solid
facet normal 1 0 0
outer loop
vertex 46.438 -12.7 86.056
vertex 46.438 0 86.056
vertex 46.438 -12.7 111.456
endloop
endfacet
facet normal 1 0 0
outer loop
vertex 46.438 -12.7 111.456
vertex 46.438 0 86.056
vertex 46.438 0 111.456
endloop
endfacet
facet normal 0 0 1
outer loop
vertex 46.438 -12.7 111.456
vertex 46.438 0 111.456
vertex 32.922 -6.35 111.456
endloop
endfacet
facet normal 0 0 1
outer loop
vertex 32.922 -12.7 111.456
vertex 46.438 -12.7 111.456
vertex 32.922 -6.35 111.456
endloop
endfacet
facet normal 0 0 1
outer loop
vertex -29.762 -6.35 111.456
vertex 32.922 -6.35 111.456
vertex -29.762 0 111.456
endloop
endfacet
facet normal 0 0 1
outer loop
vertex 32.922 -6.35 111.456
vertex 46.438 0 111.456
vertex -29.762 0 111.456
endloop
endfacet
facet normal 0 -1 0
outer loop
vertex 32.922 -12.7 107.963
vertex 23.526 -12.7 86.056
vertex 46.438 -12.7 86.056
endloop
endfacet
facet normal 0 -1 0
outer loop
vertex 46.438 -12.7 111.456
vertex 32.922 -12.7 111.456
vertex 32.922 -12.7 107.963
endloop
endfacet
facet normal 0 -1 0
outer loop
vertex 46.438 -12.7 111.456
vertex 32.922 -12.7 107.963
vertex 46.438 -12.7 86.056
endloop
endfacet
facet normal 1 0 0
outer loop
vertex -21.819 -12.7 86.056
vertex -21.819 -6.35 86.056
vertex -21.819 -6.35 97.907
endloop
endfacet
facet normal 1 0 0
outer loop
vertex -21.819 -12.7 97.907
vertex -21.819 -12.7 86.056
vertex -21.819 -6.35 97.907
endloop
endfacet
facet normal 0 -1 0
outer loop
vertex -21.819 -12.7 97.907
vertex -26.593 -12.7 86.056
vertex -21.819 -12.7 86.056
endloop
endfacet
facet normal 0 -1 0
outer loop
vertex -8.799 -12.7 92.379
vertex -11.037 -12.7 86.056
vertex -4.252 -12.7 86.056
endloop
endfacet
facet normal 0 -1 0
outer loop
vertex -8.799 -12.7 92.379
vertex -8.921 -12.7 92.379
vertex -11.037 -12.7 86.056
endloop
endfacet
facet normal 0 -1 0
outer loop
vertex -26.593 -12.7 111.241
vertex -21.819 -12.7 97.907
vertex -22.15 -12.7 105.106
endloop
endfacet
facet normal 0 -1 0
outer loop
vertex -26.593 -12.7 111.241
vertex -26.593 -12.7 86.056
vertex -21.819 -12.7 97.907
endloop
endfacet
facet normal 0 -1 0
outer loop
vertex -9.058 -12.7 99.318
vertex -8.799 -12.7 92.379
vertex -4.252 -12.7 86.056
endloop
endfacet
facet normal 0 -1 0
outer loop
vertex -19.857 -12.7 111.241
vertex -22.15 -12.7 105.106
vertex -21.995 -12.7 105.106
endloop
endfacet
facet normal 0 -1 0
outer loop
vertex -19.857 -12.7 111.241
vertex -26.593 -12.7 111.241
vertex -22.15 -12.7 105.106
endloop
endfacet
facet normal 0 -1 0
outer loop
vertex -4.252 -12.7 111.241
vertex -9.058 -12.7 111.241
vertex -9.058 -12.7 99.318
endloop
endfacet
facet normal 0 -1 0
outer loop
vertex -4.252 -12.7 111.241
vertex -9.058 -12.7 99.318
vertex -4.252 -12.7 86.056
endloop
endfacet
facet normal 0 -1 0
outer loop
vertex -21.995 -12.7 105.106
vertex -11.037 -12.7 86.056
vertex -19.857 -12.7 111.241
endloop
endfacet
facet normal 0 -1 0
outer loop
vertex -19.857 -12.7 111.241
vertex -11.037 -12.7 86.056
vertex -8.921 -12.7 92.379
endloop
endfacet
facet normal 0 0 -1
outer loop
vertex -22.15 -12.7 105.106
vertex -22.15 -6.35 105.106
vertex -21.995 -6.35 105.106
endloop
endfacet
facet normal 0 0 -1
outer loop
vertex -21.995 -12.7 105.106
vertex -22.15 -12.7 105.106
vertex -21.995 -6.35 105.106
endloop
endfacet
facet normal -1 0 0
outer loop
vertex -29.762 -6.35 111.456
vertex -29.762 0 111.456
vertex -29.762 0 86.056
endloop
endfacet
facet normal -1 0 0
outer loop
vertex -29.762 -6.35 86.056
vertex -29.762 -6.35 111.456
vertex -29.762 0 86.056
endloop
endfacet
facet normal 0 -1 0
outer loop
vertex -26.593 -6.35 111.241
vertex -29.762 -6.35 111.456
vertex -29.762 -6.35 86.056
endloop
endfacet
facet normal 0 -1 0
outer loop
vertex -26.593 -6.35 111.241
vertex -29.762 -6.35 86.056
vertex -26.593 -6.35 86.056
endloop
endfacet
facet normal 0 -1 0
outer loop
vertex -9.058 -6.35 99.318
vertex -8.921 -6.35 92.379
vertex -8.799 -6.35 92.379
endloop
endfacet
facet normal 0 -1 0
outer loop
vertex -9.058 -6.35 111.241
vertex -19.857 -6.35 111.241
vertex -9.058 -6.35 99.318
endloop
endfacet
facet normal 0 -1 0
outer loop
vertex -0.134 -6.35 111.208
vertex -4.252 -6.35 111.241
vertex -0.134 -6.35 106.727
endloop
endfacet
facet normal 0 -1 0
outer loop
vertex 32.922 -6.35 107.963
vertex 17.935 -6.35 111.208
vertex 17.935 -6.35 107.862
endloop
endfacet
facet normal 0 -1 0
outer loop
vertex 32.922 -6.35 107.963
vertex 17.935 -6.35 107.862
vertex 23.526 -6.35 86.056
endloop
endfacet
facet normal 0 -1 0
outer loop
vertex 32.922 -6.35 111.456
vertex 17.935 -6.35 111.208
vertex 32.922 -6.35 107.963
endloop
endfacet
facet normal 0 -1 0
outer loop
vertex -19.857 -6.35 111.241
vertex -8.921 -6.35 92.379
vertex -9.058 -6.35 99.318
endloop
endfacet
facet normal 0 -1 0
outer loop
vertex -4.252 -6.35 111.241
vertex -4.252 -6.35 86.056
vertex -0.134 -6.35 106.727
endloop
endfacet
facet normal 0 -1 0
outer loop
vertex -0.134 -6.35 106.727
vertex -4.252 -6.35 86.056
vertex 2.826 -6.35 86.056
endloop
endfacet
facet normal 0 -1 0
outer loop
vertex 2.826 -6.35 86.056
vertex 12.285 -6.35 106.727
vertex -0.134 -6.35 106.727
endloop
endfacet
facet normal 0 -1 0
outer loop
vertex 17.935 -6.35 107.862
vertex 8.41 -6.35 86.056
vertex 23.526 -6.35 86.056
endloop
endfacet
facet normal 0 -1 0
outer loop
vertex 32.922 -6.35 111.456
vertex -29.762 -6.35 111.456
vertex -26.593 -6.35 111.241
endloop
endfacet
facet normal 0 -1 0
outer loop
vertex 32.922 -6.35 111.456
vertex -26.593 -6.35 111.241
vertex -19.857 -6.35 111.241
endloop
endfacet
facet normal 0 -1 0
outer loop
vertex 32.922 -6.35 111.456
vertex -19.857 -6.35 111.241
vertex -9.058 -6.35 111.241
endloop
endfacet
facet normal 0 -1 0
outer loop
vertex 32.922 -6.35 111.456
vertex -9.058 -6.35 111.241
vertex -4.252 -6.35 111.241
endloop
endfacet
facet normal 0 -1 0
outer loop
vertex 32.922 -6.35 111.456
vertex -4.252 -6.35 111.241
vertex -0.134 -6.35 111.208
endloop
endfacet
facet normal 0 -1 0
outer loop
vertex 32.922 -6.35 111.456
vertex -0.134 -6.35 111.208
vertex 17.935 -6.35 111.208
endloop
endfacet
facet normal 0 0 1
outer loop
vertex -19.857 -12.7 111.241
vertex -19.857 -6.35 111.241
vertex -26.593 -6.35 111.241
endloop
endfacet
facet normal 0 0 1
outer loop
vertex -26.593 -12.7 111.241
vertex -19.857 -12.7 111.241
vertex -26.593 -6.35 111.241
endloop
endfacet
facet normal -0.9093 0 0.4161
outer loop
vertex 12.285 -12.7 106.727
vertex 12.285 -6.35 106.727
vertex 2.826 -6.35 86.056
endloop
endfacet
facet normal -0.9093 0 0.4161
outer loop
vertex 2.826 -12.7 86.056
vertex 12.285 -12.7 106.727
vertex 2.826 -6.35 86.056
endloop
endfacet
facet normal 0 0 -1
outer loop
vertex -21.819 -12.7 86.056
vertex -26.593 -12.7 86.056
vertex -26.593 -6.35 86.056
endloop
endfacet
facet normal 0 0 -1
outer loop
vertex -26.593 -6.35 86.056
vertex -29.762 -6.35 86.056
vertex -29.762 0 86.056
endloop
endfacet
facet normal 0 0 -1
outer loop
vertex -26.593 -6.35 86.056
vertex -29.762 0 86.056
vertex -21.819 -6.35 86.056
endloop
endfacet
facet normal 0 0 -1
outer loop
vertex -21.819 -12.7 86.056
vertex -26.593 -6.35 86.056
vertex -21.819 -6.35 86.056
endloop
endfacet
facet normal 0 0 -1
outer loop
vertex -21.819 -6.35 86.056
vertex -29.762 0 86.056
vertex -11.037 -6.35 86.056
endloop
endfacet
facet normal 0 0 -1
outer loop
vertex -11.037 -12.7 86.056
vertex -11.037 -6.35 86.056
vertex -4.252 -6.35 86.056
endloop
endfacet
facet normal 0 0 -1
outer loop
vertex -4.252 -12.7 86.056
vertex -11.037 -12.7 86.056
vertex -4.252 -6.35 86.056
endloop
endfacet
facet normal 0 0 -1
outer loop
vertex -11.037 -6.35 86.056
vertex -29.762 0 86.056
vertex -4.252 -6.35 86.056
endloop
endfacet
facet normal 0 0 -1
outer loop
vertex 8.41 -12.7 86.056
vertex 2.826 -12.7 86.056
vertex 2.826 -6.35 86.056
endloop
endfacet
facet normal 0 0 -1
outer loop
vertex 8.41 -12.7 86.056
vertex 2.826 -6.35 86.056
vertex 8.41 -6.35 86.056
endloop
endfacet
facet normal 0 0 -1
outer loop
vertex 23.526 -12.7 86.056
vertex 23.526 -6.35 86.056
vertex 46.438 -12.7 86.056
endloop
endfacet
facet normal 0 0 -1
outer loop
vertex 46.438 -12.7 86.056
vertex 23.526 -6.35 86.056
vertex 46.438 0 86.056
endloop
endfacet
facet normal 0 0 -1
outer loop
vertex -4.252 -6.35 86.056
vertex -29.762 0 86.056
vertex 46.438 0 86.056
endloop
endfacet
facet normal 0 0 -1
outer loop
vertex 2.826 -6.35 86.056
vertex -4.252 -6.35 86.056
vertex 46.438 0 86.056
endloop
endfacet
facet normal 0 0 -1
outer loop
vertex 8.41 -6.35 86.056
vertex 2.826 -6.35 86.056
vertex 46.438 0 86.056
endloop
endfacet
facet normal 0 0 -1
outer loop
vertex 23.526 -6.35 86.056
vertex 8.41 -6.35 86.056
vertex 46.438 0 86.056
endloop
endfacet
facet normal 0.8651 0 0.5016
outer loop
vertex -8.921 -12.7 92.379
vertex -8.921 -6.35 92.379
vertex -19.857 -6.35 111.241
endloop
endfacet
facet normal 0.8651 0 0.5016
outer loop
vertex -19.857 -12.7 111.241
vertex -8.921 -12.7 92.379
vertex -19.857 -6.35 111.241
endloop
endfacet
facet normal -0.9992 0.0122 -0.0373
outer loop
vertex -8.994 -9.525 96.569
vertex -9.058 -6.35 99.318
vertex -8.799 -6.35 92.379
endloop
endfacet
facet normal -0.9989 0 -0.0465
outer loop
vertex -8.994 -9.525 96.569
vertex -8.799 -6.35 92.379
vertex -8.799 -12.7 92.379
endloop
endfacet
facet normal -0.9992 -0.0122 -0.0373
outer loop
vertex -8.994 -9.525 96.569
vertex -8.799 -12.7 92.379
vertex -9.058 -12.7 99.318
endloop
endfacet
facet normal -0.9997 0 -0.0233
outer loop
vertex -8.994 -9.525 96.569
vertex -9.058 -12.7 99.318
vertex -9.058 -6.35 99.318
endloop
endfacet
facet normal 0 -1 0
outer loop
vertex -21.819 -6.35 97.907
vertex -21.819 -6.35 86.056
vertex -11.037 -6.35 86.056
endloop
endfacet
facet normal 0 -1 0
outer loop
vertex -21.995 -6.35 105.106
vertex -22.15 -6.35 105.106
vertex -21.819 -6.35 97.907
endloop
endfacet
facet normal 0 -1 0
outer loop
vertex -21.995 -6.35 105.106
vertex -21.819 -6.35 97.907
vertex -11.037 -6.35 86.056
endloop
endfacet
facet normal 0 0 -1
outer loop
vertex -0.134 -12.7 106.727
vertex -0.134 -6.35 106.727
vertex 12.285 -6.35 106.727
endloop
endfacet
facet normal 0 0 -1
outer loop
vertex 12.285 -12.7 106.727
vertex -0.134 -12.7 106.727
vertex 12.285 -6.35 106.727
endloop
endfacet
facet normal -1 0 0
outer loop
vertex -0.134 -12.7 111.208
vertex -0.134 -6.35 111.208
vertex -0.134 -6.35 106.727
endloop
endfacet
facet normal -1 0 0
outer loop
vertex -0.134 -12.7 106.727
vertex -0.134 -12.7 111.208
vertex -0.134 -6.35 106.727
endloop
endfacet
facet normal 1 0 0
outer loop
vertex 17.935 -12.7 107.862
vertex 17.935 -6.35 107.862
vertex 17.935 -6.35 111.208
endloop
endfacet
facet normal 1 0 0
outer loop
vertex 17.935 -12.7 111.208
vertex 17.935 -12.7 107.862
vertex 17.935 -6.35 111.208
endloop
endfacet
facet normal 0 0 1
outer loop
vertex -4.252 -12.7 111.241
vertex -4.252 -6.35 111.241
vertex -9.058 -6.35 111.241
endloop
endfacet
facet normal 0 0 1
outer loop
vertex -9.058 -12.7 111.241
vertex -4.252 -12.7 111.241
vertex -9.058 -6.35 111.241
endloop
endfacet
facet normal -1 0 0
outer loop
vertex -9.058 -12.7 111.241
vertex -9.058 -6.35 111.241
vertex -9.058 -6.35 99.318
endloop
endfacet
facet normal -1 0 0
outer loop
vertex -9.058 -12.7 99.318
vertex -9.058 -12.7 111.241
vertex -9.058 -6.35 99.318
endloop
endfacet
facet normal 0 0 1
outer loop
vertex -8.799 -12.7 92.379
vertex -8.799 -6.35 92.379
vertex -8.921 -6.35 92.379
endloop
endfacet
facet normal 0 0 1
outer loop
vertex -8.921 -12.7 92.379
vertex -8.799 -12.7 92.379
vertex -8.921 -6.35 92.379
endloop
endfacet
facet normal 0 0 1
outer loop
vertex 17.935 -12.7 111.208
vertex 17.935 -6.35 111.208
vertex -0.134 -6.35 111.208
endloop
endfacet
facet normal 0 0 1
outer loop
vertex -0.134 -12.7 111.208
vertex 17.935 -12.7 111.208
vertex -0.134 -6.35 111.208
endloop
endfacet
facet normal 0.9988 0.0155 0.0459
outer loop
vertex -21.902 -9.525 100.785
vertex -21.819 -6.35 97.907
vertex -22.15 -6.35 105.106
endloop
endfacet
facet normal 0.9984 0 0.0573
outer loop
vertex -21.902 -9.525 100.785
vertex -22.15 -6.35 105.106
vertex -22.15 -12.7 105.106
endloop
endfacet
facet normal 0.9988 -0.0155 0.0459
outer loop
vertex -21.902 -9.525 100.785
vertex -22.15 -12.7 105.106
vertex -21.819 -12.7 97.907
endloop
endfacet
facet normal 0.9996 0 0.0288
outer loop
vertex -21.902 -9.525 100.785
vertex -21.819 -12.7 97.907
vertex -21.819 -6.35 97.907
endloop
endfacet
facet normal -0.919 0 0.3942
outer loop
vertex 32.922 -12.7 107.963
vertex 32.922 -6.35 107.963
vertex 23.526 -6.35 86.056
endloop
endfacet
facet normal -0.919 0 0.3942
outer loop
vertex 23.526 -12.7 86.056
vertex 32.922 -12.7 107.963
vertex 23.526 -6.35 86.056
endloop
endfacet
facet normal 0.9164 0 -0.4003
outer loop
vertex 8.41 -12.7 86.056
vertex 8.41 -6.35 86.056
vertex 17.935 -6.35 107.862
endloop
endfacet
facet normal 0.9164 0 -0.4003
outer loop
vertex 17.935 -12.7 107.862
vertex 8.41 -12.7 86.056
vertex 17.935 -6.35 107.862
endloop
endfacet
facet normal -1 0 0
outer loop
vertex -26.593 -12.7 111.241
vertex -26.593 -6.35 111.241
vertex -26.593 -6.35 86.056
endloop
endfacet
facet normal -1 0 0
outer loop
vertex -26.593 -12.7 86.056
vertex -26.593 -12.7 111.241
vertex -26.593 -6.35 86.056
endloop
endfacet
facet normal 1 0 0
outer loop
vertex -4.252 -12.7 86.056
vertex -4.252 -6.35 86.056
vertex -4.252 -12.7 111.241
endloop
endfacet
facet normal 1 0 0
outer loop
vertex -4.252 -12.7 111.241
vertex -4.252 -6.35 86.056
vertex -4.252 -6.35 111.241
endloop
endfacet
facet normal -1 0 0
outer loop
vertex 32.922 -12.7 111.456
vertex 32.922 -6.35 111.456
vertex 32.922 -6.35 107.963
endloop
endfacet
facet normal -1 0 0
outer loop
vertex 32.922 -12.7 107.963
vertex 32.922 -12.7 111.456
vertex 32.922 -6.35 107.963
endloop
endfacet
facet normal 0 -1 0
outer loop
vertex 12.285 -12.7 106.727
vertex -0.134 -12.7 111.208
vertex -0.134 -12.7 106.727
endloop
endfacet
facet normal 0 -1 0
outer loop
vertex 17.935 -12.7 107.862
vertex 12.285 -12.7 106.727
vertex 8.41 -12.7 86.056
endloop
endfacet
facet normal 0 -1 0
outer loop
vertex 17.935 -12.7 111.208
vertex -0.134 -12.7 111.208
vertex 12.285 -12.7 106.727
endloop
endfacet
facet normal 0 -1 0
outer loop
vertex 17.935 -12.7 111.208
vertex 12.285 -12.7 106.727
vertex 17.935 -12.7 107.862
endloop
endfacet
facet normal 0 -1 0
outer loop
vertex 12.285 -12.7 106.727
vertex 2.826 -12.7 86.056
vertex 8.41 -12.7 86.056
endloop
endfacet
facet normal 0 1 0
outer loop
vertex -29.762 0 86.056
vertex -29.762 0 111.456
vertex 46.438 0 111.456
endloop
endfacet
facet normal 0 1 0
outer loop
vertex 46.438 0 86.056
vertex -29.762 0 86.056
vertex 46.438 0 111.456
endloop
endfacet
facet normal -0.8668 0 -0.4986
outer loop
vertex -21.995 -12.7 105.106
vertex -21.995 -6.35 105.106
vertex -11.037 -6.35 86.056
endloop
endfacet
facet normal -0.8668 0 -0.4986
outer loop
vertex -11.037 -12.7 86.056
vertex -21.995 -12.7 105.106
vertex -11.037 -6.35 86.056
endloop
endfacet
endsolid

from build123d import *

# Parameters (mm, degrees)
F1_DEPTH = 6.35
F2_DEPTH = 12.7
F3_DEPTH = 12.7
F4_DEPTH = 12.7


with BuildPart() as f1:
    # F0 (on Front) → F1 (new body)
    with BuildSketch(Plane.XZ):
        with BuildLine():
            Line((-21.8190787262, 97.9073354615), (-21.8190787262, 86.0562069893))
            Line((-21.8190787262, 86.0562069893), (-11.0373078929, 86.0562069893))
            Line((-11.0373078929, 86.0562069893), (-21.9954676151, 105.1062069893))
            Line((-21.9954676151, 105.1062069893), (-22.1498078929, 105.1062069893))
            add(Edge.make_bspline(
                [(-22.1498078929, 105.1062069893), (-21.8190787262, 100.0625871976), (-21.8190787262, 97.9073354615)],
                knots=[0, 0, 0, 1, 1, 1], degree=2))
        make_face()
    extrude(amount=F1_DEPTH)



with BuildPart() as f1b:
    # F0 (on Front) → F1, piece 2 (new body)
    with BuildSketch(Plane.XZ):
        with BuildLine():
            Line((20.2221105099, 111.4562069893), (-29.762090879, 111.4562069893))
            Line((-29.762090879, 111.4562069893), (-29.762090879, 86.0562069893))
            Line((-29.762090879, 86.0562069893), (-26.5926030318, 86.0562069893))
            Line((-26.5926030318, 86.0562069893), (-26.5926030318, 111.241233031))
            Line((-26.5926030318, 111.241233031), (-19.8567523373, 111.241233031))
            Line((-19.8567523373, 111.241233031), (-8.9206412262, 92.3786462254))
            Line((-8.9206412262, 92.3786462254), (-8.7993738651, 92.3786462254))
            add(Edge.make_bspline(
                [(-8.7993738651, 92.3786462254), (-9.0584450457, 97.2899743504), (-9.0584450457, 99.3184465726)],
                knots=[0, 0, 0, 1, 1, 1], degree=2))
            Line((-9.0584450457, 99.3184465726), (-9.0584450457, 111.241233031))
            Line((-9.0584450457, 111.241233031), (-4.2518478234, 111.241233031))
            Line((-4.2518478234, 111.241233031), (-4.2518478234, 86.0562069893))
            Line((-4.2518478234, 86.0562069893), (2.8257563432, 86.0562069893))
            Line((2.8257563432, 86.0562069893), (12.2846105099, 106.726779906))
            Line((12.2846105099, 106.726779906), (-0.1342696984, 106.726779906))
            Line((-0.1342696984, 106.726779906), (-0.1342696984, 111.2081601143))
            Line((-0.1342696984, 111.2081601143), (17.9345671071, 111.2081601143))
            Line((17.9345671071, 111.2081601143), (17.9345671071, 107.8622833782))
            Line((17.9345671071, 107.8622833782), (8.4095671071, 86.0562069893))
            Line((8.4095671071, 86.0562069893), (20.2221105099, 86.0562069893))
            Line((20.2221105099, 86.0562069893), (23.5261658816, 86.0562069893))
            Line((23.5261658816, 86.0562069893), (32.9221105099, 107.9628691077))
            Line((32.9221105099, 107.9628691077), (32.9221105099, 111.4562069893))
            Line((32.9221105099, 111.4562069893), (20.2221105099, 111.4562069893))
        make_face()
    extrude(amount=F1_DEPTH)

    # F0 (on Front) → F2 (join)
    with BuildSketch(Plane.XZ):
        Polygon((2.8257563432, 86.0562069893), (8.4095671071, 86.0562069893), (17.9345671071, 107.8622833782), (17.9345671071, 111.2081601143), (-0.1342696984, 111.2081601143), (-0.1342696984, 106.726779906), (12.2846105099, 106.726779906), align=None)
    extrude(amount=F2_DEPTH)


with BuildPart() as f1_1:
    add(f1.part)

    add(f1b.part)  # F3 merges F1b
    # F0 (on Front) → F3 (join)
    with BuildSketch(Plane.XZ):
        with BuildLine():
            Line((-26.5926030318, 111.241233031), (-26.5926030318, 86.0562069893))
            Line((-26.5926030318, 86.0562069893), (-21.8190787262, 86.0562069893))
            Line((-21.8190787262, 86.0562069893), (-21.8190787262, 97.9073354615))
            add(Edge.make_bspline(
                [(-22.1498078929, 105.1062069893), (-21.8190787262, 100.0625871976), (-21.8190787262, 97.9073354615)],
                knots=[0, 0, 0, 1, 1, 1], degree=2))
            Line((-22.1498078929, 105.1062069893), (-21.9954676151, 105.1062069893))
            Line((-21.9954676151, 105.1062069893), (-11.0373078929, 86.0562069893))
            Line((-11.0373078929, 86.0562069893), (-4.2518478234, 86.0562069893))
            Line((-4.2518478234, 86.0562069893), (-4.2518478234, 111.241233031))
            Line((-4.2518478234, 111.241233031), (-9.0584450457, 111.241233031))
            Line((-9.0584450457, 111.241233031), (-9.0584450457, 99.3184465726))
            add(Edge.make_bspline(
                [(-8.7993738651, 92.3786462254), (-9.0584450457, 97.2899743504), (-9.0584450457, 99.3184465726)],
                knots=[0, 0, 0, 1, 1, 1], degree=2))
            Line((-8.7993738651, 92.3786462254), (-8.9206412262, 92.3786462254))
            Line((-8.9206412262, 92.3786462254), (-19.8567523373, 111.241233031))
            Line((-19.8567523373, 111.241233031), (-26.5926030318, 111.241233031))
        make_face()
    extrude(amount=F3_DEPTH)

    # F0 (on Front) → F4 (join)
    with BuildSketch(Plane.XZ):
        Polygon((46.437909121, 111.4562069893), (32.9221105099, 111.4562069893), (32.9221105099, 107.9628691077), (23.5261658816, 86.0562069893), (46.437909121, 86.0562069893), align=None)
    extrude(amount=F4_DEPTH)


solid = f1_1.part
